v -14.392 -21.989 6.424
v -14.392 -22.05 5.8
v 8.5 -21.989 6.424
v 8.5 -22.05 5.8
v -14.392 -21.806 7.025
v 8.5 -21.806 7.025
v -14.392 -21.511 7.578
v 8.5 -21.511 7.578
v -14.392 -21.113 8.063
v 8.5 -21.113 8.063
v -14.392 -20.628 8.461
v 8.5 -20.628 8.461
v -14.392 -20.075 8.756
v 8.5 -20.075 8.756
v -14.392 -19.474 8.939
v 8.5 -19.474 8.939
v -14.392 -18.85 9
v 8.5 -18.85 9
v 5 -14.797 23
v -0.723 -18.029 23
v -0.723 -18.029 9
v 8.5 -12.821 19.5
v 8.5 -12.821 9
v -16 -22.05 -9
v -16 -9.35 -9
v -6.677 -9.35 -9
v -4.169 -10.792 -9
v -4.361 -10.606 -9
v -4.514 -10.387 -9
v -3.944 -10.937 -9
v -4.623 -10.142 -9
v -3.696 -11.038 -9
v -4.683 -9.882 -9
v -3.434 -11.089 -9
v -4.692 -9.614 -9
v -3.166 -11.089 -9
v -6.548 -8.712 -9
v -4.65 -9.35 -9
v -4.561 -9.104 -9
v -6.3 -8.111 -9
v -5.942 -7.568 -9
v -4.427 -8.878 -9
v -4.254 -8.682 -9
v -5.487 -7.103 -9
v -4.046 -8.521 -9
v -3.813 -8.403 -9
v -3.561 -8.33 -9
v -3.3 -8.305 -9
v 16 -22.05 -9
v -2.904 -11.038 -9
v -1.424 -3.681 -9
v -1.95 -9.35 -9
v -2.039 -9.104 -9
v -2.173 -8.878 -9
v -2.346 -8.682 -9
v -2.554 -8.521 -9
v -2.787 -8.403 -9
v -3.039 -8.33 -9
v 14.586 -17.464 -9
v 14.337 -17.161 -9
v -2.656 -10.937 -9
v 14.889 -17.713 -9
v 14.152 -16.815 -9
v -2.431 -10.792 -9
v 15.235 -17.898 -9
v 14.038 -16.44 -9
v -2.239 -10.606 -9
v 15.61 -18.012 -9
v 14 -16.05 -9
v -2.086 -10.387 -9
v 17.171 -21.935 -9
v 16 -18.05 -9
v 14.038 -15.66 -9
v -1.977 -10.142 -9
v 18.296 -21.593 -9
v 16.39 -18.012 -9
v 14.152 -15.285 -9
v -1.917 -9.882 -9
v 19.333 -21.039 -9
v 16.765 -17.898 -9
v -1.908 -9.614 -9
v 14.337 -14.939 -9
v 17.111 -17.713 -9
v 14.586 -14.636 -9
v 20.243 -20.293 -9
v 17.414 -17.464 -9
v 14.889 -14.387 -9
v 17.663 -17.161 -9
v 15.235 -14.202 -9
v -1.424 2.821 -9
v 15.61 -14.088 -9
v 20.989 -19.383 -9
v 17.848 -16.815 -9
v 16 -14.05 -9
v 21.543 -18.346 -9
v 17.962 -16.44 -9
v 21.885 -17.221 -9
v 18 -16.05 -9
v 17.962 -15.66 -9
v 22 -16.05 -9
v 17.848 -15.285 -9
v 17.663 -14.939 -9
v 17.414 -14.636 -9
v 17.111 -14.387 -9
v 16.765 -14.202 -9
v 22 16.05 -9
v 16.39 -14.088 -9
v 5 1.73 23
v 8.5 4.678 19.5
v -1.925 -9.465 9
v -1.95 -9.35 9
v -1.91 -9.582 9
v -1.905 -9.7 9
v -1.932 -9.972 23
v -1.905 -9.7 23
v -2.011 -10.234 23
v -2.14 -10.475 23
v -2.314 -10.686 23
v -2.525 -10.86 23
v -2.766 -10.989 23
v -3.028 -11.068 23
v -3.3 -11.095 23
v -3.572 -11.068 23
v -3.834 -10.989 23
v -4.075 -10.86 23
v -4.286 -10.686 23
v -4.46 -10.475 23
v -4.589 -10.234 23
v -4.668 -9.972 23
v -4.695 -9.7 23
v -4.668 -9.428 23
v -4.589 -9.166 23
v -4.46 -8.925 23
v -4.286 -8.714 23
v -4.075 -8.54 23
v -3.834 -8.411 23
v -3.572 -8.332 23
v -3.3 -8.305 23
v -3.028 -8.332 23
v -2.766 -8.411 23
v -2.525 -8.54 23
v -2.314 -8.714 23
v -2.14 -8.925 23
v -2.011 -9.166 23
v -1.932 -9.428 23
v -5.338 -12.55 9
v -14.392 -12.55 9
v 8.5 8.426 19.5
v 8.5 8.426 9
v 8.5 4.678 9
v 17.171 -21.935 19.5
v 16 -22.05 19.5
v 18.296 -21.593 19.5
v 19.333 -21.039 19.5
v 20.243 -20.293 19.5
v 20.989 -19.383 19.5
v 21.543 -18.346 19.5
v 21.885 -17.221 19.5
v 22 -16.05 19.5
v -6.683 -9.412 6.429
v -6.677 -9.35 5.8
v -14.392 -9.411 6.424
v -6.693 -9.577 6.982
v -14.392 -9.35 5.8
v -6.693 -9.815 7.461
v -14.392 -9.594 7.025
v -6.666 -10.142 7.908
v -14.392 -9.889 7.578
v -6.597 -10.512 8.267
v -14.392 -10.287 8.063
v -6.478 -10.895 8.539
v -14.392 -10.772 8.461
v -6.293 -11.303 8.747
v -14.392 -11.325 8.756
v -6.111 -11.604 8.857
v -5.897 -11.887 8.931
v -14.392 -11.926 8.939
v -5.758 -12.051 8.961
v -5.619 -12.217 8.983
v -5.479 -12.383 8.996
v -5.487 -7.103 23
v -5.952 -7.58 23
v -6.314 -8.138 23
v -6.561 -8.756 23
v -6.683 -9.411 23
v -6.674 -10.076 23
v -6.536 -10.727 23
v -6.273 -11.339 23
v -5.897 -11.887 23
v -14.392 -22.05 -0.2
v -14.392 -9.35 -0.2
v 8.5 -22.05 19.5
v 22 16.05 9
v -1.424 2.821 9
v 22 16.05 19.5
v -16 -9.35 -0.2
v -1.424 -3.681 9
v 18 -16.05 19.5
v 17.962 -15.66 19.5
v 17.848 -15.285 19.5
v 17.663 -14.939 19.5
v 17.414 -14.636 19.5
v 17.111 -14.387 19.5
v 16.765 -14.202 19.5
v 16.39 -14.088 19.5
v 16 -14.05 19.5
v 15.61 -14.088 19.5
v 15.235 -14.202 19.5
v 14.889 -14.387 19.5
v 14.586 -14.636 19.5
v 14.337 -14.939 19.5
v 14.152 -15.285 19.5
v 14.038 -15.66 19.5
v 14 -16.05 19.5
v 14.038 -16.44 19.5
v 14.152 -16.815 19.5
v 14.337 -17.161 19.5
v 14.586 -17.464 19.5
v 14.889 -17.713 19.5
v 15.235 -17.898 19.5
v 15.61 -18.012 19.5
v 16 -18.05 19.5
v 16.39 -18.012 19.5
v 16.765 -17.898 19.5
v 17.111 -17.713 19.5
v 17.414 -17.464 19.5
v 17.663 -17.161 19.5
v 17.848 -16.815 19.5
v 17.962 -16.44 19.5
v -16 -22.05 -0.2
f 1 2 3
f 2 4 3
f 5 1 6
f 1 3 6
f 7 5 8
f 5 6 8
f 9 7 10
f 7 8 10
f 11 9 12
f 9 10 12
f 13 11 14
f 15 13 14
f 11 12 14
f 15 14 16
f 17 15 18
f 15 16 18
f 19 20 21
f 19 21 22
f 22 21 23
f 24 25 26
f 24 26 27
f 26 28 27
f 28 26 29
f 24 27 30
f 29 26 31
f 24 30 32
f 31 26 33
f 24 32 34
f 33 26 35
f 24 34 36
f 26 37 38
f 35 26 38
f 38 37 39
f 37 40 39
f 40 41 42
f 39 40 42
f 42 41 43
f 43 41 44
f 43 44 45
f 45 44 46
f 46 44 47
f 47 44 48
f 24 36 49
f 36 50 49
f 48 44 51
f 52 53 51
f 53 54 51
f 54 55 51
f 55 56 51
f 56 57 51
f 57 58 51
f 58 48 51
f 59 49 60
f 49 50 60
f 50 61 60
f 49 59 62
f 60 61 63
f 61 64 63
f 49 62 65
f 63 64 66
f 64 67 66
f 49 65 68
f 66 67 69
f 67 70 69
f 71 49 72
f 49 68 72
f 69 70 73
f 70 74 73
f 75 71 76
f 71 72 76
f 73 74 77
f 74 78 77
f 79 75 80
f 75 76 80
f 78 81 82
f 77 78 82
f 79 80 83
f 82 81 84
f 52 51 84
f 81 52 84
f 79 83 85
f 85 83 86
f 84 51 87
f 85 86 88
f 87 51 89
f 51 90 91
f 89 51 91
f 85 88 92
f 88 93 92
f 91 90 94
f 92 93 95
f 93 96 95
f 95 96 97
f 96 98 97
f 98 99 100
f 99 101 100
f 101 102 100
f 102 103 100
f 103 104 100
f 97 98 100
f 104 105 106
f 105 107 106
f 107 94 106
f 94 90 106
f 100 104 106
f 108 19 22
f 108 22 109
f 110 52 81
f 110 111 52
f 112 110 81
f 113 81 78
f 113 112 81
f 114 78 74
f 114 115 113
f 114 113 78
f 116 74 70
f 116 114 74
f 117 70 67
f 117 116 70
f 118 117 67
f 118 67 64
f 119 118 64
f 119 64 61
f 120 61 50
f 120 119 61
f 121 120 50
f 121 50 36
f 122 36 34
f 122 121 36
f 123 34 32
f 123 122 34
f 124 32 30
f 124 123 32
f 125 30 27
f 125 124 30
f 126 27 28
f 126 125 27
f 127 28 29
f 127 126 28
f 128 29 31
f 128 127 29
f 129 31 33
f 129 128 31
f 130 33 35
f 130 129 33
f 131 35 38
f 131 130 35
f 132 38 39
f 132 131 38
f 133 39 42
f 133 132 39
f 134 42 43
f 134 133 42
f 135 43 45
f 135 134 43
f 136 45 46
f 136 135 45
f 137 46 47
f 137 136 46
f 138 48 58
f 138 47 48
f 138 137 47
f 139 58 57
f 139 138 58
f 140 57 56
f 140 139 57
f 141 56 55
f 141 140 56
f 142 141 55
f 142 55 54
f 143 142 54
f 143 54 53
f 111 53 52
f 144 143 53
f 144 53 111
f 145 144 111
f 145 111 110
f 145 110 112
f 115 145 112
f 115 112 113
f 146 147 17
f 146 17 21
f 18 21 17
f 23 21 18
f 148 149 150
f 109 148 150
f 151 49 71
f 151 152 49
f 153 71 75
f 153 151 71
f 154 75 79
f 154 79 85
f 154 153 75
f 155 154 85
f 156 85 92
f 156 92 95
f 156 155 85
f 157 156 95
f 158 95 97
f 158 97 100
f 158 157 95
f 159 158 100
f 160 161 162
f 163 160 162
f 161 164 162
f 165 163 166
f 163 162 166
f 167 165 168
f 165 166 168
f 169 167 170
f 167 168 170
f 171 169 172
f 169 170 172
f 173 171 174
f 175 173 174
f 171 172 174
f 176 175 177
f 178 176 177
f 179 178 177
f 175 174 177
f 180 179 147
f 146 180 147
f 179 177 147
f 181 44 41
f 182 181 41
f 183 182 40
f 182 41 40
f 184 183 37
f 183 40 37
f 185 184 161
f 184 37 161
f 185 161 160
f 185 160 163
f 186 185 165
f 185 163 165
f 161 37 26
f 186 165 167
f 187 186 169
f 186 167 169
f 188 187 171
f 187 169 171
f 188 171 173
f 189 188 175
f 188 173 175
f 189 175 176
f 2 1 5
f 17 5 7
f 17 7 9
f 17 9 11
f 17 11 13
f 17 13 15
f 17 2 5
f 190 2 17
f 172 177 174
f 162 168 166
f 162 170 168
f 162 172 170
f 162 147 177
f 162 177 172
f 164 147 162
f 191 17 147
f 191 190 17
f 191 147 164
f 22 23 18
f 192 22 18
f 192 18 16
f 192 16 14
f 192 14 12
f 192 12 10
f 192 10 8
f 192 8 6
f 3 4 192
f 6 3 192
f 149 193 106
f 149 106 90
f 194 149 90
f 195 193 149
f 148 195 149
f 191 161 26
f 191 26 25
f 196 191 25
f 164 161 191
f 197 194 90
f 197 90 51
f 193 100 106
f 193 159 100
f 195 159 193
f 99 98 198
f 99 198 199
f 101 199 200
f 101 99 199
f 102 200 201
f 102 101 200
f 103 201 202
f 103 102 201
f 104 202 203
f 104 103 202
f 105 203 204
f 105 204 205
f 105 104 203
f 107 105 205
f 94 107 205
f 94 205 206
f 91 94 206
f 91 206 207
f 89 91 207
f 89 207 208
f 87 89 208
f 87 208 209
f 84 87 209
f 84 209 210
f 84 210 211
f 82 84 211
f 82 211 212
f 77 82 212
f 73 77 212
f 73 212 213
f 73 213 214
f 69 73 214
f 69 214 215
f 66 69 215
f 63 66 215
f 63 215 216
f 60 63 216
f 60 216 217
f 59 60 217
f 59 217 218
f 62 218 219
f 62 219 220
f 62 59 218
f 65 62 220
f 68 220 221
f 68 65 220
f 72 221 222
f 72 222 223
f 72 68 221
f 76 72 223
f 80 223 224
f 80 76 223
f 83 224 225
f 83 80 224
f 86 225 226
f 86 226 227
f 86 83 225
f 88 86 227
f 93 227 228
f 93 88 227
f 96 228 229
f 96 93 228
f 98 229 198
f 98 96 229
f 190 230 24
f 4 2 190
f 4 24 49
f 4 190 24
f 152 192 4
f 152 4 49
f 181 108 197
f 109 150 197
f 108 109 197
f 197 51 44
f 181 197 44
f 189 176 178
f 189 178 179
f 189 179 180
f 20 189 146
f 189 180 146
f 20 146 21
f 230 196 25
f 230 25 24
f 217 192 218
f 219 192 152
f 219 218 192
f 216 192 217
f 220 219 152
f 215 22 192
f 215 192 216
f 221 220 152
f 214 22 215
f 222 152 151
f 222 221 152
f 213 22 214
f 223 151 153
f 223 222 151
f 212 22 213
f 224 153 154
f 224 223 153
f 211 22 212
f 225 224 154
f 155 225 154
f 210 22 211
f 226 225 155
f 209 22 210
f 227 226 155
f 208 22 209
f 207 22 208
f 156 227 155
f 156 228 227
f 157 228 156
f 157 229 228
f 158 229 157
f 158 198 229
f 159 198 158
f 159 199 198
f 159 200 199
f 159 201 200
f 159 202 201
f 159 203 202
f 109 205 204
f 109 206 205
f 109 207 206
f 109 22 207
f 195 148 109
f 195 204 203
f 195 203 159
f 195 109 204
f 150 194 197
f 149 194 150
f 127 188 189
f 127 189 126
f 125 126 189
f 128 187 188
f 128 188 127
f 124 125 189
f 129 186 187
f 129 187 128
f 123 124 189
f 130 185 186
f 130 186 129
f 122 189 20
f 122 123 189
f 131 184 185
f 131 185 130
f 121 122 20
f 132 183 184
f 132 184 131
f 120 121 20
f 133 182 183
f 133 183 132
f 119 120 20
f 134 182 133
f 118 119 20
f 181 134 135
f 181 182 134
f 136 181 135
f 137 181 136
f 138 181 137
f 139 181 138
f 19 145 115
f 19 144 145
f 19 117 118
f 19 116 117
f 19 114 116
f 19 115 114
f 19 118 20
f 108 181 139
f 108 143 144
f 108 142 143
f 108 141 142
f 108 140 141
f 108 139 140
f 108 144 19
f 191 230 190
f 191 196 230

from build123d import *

# Parameters (mm, degrees)
SKETCH8_R           = 2
BOSS_EXTRUDE6_DEPTH = 9
BOSS_EXTRUDE7_START = -9
SKETCH9_R           = 1.395
BOSS_EXTRUDE7_DEPTH = 32
CHAMFER3_SIZE       = 3.5
BOSS_EXTRUDE8_START = -9
SKETCH11_R          = 2
BOSS_EXTRUDE8_DEPTH = 28.5
CUT_EXTRUDE1_START  = -0.2
CUT_EXTRUDE1_DEPTH  = 24.2
FILLET5_R           = 3.2


with BuildPart() as part:
    # Sketch8 → Boss-Extrude6 (new body, symmetric)
    with BuildSketch(Plane.XY):
        with BuildLine():
            Line((-16, -16.195281799), (-16, -22.05))
            Line((-16, -22.05), (16, -22.05))
            ThreePointArc((16, -22.05), (20.242640687, -20.292640687), (22, -16.05))
            Line((22, -16.05), (22, 16.05))
            Line((22, 16.05), (-1.424393869, 2.820825363))
            Line((-1.424393869, 2.820825363), (-1.424393869, -9.35))
            Line((-1.424393869, -9.35), (-1.949620424, -9.35))
            ThreePointArc((-1.949620424, -9.35), (-3.3, -11.095), (-4.650379576, -9.35))
            Line((-4.650379576, -9.35), (-16, -9.35))
            Line((-16, -9.35), (-16, -16.195281799))
        make_face()
        with Locations((16, -16.05)):
            Circle(SKETCH8_R, mode=Mode.SUBTRACT)
    extrude(amount=BOSS_EXTRUDE6_DEPTH, both=True)

    # Sketch9 → Boss-Extrude7 (add)
    with BuildSketch(Plane.XY.offset(BOSS_EXTRUDE7_START)):
        with BuildLine():
            Line((8.5, 4.678478311), (-5.487189769, -7.103420343))
            ThreePointArc((-5.487189769, -7.103420343), (-6.682635801, -9.410517634), (-5.896579657, -11.887189769))
            Line((-5.896579657, -11.887189769), (-0.72278451, -18.029396273))
            Line((-0.72278451, -18.029396273), (8.5, -12.820730998))
            Line((8.5, -12.820730998), (8.5, 4.678478311))
        make_face()
        with Locations((-3.3, -9.7)):
            Circle(SKETCH9_R, mode=Mode.SUBTRACT)
    extrude(amount=BOSS_EXTRUDE7_DEPTH)

    # Chamfer3
    chamfer3_edges = [part.edges().sort_by_distance(p)[0] for p in [
        (8.5, -4.071126344, 23),
    ]]
    chamfer(chamfer3_edges, length=CHAMFER3_SIZE)

    # Sketch11 → Boss-Extrude8 (add)
    with BuildSketch(Plane.XY.offset(BOSS_EXTRUDE8_START)):
        with BuildLine():
            Line((8.5, 8.425731957), (8.5, -22.05))
            Line((8.5, -22.05), (16, -22.05))
            ThreePointArc((16, -22.05), (20.242640687, -20.292640687), (22, -16.05))
            Line((22, -16.05), (22, 16.05))
            Line((22, 16.05), (8.5, 8.425731957))
        make_face()
        with Locations((16, -16.05)):
            Circle(SKETCH11_R, mode=Mode.SUBTRACT)
    extrude(amount=BOSS_EXTRUDE8_DEPTH)

    # Sketch8<4> → Cut-Extrude1 (cut, through all)
    with BuildSketch(Plane.XY.offset(CUT_EXTRUDE1_START)):
        Polygon((-16, -16.195281799), (-16, -22.05), (-14.391687016, -22.05), (-14.391687016, -9.35), (-16, -9.35), align=None)
    extrude(amount=CUT_EXTRUDE1_DEPTH, mode=Mode.SUBTRACT)

    # Fillet5
    fillet5_edges = [part.edges().sort_by_distance(p)[0] for p in [
        (-10.534298793, -9.35, 9),
        (-2.945843508, -22.05, 9),
    ]]
    fillet(fillet5_edges, radius=FILLET5_R)


solid = part.part
